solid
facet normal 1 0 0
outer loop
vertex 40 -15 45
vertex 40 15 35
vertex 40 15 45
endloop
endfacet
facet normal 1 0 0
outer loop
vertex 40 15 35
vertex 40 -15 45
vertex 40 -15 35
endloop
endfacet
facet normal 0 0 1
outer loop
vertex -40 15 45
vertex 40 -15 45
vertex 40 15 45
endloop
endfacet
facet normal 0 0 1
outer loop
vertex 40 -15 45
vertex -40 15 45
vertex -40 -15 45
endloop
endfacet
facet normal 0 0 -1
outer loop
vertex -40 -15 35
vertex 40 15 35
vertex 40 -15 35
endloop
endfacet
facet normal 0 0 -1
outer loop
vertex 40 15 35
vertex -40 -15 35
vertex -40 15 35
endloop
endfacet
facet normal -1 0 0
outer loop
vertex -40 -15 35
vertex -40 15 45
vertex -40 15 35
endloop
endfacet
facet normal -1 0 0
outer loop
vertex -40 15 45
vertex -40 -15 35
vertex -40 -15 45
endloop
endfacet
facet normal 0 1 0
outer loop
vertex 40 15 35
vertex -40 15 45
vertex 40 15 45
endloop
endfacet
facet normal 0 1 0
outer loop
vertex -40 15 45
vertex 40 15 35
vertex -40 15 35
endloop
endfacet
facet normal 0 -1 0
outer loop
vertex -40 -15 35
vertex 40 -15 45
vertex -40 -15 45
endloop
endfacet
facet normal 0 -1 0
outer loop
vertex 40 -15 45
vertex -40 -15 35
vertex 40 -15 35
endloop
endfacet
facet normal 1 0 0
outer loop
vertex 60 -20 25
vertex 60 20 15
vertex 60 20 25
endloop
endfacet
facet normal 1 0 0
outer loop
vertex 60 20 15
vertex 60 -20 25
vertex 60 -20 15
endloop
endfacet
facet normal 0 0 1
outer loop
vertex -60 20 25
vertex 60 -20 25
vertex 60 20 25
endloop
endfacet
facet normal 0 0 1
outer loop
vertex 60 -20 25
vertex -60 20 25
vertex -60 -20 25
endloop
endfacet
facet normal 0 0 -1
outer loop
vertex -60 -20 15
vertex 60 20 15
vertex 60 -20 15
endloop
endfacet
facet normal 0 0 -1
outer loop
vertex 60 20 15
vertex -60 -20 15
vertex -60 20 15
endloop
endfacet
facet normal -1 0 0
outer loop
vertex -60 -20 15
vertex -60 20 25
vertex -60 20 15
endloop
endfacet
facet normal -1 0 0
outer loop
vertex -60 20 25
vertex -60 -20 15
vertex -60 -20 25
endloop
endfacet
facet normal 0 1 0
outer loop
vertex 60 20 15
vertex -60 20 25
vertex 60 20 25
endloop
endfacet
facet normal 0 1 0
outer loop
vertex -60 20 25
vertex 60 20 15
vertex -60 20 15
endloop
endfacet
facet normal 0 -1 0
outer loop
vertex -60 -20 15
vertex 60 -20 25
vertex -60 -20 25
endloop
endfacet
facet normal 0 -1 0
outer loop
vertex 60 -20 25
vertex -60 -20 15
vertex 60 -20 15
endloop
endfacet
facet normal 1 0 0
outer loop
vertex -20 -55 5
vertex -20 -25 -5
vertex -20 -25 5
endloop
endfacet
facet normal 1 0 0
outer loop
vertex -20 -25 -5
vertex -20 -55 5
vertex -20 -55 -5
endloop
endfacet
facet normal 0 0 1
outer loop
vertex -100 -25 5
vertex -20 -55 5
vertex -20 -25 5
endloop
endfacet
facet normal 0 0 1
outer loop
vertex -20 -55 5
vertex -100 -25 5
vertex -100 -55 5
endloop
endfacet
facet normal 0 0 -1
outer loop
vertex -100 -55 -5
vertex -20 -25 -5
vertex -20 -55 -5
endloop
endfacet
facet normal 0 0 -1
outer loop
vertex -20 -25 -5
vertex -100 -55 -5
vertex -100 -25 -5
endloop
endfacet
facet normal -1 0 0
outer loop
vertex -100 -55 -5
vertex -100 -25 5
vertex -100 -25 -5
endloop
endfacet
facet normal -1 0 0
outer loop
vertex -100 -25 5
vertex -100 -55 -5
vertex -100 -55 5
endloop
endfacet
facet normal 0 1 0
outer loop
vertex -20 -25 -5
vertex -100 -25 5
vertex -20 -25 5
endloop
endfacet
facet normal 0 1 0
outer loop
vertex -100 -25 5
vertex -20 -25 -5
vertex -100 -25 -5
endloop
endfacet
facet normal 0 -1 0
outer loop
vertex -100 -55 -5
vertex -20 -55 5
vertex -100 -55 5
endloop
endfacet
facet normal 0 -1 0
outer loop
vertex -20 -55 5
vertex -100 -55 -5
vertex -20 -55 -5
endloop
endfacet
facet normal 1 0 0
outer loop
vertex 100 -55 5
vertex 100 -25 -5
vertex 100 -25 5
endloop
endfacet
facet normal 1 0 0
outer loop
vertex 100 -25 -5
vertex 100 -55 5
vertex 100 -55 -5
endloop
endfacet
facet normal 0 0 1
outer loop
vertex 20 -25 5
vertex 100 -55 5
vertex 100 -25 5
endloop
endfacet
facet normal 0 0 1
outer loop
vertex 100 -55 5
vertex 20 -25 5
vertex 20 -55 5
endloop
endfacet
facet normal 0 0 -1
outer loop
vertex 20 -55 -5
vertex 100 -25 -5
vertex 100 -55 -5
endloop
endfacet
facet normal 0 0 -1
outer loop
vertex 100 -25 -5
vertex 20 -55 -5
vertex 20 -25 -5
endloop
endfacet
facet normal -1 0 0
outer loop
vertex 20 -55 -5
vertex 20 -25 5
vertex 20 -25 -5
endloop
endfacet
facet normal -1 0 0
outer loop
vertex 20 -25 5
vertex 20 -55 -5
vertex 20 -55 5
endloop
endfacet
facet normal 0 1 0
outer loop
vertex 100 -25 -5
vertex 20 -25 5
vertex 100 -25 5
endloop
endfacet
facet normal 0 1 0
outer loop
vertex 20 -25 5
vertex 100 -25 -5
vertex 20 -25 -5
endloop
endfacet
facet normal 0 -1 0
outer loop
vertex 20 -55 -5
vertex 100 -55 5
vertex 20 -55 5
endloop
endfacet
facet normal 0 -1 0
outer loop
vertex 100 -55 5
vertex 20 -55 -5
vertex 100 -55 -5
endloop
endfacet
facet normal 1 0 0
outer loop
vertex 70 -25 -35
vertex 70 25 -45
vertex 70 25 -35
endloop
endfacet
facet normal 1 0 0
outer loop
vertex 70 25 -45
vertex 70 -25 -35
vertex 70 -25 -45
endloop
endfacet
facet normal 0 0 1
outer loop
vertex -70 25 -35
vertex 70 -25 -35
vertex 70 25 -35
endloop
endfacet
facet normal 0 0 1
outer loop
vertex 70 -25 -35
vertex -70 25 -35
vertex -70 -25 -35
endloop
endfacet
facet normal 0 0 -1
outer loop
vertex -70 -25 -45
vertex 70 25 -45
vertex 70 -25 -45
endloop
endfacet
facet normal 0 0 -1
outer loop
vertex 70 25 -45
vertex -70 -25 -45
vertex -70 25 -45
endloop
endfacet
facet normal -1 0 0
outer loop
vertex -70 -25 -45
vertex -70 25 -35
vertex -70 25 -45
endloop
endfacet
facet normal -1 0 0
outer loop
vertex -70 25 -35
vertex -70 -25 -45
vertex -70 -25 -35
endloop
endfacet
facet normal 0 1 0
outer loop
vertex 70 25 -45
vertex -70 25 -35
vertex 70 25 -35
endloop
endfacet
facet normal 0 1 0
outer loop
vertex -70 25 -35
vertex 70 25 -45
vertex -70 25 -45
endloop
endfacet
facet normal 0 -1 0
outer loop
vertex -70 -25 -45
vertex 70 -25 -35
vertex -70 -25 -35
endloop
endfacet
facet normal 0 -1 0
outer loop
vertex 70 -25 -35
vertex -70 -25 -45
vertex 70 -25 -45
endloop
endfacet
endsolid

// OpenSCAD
$fn = 50;

// Basic block builder
module block(pos=[0,0,0], size=[40,20,10], label="") {
    translate(pos)
    cube(size, center=true);
}

// Layers (Z axis = system depth)

// Identity Layer
block([0,0,40], [80,30,10], "Identity");

// KMS Server Layer
block([0,0,20], [120,40,10], "FastAPI KMS");

// Wallet Layer
block([-60,-40,0], [80,30,10], "Wallet");
block([60,-40,0], [80,30,10], "Node");

// P2P Layer
block([0,0,-40], [140,50,10], "P2P Blockchain");
